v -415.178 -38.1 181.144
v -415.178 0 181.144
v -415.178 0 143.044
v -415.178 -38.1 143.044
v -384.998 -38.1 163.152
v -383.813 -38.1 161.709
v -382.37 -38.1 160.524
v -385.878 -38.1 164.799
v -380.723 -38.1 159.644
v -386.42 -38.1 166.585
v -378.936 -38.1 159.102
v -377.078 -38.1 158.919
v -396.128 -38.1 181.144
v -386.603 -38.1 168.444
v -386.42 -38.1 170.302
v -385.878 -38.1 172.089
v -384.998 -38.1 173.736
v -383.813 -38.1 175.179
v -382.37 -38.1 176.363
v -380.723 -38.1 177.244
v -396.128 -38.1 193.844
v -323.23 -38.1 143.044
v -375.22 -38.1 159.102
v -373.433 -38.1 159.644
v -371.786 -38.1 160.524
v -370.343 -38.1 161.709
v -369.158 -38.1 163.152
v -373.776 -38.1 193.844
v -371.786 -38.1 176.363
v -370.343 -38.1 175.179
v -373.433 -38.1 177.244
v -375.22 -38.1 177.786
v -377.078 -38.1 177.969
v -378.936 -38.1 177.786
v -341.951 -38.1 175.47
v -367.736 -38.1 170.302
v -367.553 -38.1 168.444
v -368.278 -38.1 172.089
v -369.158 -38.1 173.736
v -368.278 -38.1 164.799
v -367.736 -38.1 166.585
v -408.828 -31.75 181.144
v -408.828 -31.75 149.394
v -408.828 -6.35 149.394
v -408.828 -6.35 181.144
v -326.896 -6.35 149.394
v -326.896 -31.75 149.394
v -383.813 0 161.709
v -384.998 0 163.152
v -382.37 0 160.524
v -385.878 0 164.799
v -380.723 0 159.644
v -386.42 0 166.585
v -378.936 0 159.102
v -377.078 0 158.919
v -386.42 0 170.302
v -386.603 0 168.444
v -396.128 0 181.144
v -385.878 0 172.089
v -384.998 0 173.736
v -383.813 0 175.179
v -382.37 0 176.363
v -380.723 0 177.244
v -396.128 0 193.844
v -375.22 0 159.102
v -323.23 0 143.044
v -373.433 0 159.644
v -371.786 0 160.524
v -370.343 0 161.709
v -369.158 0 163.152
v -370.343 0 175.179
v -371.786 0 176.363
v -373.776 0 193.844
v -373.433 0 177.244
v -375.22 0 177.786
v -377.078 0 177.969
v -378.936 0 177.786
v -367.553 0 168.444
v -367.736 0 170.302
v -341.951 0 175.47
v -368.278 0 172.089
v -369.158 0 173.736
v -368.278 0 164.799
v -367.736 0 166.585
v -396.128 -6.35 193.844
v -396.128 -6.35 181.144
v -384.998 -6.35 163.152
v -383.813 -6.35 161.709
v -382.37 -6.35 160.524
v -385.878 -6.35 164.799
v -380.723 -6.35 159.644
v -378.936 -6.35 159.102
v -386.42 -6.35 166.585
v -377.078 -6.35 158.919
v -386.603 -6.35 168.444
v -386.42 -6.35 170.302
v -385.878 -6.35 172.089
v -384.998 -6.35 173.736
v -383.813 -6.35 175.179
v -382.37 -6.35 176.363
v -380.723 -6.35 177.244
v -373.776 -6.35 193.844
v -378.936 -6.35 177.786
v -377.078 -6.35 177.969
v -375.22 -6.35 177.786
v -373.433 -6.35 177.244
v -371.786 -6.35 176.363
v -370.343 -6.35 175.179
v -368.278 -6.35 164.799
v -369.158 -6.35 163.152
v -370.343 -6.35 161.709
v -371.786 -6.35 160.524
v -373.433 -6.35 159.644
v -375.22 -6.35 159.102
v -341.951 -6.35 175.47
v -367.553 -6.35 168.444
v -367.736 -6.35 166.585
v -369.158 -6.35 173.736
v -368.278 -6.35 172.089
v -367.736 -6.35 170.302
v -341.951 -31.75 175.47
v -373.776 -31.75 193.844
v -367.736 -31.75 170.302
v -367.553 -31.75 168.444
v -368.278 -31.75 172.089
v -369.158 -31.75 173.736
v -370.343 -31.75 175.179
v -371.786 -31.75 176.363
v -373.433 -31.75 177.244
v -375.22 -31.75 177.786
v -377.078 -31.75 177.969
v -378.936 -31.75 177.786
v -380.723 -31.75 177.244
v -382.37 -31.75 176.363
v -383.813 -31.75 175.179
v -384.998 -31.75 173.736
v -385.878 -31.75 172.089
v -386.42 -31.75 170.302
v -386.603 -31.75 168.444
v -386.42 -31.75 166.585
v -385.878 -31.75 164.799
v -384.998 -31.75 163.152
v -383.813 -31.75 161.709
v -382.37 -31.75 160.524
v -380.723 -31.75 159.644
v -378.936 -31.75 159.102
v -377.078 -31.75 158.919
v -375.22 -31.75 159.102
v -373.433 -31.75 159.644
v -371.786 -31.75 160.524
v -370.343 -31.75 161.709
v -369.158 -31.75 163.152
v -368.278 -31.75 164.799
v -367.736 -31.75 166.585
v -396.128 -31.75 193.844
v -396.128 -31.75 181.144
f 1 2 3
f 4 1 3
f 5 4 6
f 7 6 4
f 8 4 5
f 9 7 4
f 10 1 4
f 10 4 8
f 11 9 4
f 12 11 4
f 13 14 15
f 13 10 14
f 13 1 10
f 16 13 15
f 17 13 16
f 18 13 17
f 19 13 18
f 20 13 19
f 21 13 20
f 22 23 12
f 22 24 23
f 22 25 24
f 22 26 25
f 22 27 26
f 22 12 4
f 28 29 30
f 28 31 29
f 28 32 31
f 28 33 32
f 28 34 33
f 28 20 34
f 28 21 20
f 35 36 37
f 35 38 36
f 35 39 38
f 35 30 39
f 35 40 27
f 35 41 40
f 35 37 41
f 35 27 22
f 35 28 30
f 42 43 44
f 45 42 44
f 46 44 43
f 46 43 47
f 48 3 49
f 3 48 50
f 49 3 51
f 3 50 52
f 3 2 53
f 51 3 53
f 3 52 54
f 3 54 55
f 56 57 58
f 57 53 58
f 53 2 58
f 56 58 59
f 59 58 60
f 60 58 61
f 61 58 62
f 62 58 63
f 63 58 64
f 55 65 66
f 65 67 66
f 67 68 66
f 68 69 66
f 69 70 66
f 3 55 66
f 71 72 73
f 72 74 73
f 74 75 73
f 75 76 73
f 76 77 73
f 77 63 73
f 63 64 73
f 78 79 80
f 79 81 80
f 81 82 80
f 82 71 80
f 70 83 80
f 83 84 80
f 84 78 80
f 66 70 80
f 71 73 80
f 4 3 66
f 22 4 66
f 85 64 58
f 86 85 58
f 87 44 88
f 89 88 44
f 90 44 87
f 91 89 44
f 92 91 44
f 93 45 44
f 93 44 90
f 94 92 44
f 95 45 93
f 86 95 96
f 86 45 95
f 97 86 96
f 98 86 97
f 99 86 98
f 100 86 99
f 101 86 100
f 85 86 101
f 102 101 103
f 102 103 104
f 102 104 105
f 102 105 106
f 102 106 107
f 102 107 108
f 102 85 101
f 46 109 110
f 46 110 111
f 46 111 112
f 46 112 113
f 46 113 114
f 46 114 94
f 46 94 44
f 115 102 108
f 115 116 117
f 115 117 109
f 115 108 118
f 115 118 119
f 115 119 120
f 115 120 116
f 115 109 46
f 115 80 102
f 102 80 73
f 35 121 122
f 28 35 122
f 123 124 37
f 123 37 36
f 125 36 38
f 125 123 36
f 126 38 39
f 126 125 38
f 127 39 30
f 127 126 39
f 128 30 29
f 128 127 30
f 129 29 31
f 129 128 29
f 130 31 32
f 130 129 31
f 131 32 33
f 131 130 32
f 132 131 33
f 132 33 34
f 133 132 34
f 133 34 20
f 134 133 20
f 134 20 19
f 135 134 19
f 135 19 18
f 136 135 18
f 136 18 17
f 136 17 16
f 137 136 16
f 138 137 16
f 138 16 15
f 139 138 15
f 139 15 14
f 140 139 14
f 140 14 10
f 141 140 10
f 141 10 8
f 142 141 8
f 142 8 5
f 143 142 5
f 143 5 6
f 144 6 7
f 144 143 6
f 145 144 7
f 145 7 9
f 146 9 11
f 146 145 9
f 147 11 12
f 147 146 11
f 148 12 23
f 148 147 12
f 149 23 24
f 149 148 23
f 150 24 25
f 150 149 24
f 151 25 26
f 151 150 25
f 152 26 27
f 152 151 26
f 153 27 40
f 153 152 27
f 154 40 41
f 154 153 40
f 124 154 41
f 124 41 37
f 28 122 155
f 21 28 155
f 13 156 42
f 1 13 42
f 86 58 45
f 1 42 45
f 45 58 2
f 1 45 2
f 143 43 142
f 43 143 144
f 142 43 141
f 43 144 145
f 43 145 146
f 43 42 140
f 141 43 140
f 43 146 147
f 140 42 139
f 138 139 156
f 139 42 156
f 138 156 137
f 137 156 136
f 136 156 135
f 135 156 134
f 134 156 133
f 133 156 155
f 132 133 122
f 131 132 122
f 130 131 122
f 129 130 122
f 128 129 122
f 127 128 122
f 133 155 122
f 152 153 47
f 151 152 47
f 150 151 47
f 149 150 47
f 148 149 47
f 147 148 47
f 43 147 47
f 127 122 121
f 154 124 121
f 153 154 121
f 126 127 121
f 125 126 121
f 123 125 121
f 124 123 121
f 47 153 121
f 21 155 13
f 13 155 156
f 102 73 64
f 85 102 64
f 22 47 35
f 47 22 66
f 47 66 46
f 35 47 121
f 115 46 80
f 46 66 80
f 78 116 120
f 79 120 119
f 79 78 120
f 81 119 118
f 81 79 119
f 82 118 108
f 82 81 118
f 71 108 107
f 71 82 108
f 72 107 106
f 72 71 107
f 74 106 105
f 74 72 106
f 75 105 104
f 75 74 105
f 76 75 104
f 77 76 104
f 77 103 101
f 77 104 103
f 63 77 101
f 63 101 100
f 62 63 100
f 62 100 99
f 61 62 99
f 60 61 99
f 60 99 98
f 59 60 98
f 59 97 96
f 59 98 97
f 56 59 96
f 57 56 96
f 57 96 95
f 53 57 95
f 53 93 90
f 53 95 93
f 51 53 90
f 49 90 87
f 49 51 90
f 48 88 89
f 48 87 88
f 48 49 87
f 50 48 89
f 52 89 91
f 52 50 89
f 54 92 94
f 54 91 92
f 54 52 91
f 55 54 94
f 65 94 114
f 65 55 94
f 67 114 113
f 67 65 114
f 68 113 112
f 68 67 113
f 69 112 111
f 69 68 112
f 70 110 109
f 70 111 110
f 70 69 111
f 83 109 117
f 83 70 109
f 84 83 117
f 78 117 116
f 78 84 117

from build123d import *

# Parameters (mm, degrees)
F0_R     = 9.525
F1_DEPTH = 38.1
F2_W     = 6.35
F2_H     = 6.35
F3_DEPTH = 12.7
F4_W     = 94.41996
F4_H     = 25.4
F5_DEPTH = 44.45


with BuildPart() as f1:
    # F0 (on Front) → F1 (new body)
    with BuildSketch(Plane.XZ):
        Polygon((-396.128201, 181.143697), (-415.178201, 181.143697), (-415.178201, 143.043697), (-323.230201, 143.043697), (-341.951291, 175.469577), (-373.776201, 193.843697), (-396.128201, 193.843697), align=None)
        with Locations((-377.078201, 168.443697)):
            Circle(F0_R, mode=Mode.SUBTRACT)
    extrude(amount=F1_DEPTH)

    # F2 (on face) → F3 (join)
    with BuildSketch(Plane.XY.offset(181.143697)):
        with Locations((-405.653201, -9.525)):
            Rectangle(F2_W, F2_H)
    extrude(amount=F3_DEPTH)

    # F4 (on face) → F5 (cut)
    with BuildSketch(Plane.XY.offset(193.843697)):
        with Locations((-361.618221, -19.05)):
            Rectangle(F4_W, F4_H)
    extrude(amount=-F5_DEPTH, mode=Mode.SUBTRACT)


solid = f1.part
